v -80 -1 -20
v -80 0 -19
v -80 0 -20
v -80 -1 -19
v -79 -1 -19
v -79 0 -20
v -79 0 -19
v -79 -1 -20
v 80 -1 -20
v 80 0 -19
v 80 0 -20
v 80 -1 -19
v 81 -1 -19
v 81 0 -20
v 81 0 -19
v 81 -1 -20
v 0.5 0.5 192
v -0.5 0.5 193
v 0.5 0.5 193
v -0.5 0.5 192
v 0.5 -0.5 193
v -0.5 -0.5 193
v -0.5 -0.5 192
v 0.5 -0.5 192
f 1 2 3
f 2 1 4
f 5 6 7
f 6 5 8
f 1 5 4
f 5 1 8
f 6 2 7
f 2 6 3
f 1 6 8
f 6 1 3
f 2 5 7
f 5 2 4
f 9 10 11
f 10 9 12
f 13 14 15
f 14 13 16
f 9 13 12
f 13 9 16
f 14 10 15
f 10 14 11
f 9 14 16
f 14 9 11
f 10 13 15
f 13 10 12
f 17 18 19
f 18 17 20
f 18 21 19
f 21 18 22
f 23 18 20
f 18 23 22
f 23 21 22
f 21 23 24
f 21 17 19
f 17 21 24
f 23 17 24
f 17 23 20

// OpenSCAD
// file: dimensions.scad
box_section_outer = [25, 50];

fork_spacing = 160;

fork_length = 200;
bottom_offset = 20;
// file: ../../../../dimensions.scad
box_section_outer = [25, 25];

outer = 210;
inner = 120;

axle_diameter = 16;
// file: ../../../../parts/box_section.scad
module BoxSection(name, col, outer, length, center)
{
  echo(name, col, "outer=", outer, "length=", length);

  translate(center ? [0, 0, 0] : -[outer[0]/2, 0, outer[1]/2])
  {
    color(col)
    {
      cube([outer[0], length, outer[1]], center=center);
    }
  }
}
// main file
use <../../../../parts/box_section.scad>;

include <../../../../dimensions.scad>;

include <dimensions.scad>;

module FrontWheelForkAssembly()
{
  difference()
  {
    for (x = [-fork_spacing/2, fork_spacing/2])
    {
      translate([x, 0, -bottom_offset])
      {
        rotate([90, 0, 0])
        {
          BoxSection(box_section_outer, fork_length);
        }
      }
    }

    /* Axle holes */
    rotate([0, 90, 0])
    {
      cylinder(d=axle_diameter, h=500, center=true);
    }
  }

  translate([0, 0, fork_length - bottom_offset + box_section_outer[0]/2])
  {
    rotate([0, 90, 90])
    {
      BoxSection(box_section_outer, fork_spacing+box_section_outer[0], center=true, col="darkgreen");
    }
  }
}

FrontWheelForkAssembly();
